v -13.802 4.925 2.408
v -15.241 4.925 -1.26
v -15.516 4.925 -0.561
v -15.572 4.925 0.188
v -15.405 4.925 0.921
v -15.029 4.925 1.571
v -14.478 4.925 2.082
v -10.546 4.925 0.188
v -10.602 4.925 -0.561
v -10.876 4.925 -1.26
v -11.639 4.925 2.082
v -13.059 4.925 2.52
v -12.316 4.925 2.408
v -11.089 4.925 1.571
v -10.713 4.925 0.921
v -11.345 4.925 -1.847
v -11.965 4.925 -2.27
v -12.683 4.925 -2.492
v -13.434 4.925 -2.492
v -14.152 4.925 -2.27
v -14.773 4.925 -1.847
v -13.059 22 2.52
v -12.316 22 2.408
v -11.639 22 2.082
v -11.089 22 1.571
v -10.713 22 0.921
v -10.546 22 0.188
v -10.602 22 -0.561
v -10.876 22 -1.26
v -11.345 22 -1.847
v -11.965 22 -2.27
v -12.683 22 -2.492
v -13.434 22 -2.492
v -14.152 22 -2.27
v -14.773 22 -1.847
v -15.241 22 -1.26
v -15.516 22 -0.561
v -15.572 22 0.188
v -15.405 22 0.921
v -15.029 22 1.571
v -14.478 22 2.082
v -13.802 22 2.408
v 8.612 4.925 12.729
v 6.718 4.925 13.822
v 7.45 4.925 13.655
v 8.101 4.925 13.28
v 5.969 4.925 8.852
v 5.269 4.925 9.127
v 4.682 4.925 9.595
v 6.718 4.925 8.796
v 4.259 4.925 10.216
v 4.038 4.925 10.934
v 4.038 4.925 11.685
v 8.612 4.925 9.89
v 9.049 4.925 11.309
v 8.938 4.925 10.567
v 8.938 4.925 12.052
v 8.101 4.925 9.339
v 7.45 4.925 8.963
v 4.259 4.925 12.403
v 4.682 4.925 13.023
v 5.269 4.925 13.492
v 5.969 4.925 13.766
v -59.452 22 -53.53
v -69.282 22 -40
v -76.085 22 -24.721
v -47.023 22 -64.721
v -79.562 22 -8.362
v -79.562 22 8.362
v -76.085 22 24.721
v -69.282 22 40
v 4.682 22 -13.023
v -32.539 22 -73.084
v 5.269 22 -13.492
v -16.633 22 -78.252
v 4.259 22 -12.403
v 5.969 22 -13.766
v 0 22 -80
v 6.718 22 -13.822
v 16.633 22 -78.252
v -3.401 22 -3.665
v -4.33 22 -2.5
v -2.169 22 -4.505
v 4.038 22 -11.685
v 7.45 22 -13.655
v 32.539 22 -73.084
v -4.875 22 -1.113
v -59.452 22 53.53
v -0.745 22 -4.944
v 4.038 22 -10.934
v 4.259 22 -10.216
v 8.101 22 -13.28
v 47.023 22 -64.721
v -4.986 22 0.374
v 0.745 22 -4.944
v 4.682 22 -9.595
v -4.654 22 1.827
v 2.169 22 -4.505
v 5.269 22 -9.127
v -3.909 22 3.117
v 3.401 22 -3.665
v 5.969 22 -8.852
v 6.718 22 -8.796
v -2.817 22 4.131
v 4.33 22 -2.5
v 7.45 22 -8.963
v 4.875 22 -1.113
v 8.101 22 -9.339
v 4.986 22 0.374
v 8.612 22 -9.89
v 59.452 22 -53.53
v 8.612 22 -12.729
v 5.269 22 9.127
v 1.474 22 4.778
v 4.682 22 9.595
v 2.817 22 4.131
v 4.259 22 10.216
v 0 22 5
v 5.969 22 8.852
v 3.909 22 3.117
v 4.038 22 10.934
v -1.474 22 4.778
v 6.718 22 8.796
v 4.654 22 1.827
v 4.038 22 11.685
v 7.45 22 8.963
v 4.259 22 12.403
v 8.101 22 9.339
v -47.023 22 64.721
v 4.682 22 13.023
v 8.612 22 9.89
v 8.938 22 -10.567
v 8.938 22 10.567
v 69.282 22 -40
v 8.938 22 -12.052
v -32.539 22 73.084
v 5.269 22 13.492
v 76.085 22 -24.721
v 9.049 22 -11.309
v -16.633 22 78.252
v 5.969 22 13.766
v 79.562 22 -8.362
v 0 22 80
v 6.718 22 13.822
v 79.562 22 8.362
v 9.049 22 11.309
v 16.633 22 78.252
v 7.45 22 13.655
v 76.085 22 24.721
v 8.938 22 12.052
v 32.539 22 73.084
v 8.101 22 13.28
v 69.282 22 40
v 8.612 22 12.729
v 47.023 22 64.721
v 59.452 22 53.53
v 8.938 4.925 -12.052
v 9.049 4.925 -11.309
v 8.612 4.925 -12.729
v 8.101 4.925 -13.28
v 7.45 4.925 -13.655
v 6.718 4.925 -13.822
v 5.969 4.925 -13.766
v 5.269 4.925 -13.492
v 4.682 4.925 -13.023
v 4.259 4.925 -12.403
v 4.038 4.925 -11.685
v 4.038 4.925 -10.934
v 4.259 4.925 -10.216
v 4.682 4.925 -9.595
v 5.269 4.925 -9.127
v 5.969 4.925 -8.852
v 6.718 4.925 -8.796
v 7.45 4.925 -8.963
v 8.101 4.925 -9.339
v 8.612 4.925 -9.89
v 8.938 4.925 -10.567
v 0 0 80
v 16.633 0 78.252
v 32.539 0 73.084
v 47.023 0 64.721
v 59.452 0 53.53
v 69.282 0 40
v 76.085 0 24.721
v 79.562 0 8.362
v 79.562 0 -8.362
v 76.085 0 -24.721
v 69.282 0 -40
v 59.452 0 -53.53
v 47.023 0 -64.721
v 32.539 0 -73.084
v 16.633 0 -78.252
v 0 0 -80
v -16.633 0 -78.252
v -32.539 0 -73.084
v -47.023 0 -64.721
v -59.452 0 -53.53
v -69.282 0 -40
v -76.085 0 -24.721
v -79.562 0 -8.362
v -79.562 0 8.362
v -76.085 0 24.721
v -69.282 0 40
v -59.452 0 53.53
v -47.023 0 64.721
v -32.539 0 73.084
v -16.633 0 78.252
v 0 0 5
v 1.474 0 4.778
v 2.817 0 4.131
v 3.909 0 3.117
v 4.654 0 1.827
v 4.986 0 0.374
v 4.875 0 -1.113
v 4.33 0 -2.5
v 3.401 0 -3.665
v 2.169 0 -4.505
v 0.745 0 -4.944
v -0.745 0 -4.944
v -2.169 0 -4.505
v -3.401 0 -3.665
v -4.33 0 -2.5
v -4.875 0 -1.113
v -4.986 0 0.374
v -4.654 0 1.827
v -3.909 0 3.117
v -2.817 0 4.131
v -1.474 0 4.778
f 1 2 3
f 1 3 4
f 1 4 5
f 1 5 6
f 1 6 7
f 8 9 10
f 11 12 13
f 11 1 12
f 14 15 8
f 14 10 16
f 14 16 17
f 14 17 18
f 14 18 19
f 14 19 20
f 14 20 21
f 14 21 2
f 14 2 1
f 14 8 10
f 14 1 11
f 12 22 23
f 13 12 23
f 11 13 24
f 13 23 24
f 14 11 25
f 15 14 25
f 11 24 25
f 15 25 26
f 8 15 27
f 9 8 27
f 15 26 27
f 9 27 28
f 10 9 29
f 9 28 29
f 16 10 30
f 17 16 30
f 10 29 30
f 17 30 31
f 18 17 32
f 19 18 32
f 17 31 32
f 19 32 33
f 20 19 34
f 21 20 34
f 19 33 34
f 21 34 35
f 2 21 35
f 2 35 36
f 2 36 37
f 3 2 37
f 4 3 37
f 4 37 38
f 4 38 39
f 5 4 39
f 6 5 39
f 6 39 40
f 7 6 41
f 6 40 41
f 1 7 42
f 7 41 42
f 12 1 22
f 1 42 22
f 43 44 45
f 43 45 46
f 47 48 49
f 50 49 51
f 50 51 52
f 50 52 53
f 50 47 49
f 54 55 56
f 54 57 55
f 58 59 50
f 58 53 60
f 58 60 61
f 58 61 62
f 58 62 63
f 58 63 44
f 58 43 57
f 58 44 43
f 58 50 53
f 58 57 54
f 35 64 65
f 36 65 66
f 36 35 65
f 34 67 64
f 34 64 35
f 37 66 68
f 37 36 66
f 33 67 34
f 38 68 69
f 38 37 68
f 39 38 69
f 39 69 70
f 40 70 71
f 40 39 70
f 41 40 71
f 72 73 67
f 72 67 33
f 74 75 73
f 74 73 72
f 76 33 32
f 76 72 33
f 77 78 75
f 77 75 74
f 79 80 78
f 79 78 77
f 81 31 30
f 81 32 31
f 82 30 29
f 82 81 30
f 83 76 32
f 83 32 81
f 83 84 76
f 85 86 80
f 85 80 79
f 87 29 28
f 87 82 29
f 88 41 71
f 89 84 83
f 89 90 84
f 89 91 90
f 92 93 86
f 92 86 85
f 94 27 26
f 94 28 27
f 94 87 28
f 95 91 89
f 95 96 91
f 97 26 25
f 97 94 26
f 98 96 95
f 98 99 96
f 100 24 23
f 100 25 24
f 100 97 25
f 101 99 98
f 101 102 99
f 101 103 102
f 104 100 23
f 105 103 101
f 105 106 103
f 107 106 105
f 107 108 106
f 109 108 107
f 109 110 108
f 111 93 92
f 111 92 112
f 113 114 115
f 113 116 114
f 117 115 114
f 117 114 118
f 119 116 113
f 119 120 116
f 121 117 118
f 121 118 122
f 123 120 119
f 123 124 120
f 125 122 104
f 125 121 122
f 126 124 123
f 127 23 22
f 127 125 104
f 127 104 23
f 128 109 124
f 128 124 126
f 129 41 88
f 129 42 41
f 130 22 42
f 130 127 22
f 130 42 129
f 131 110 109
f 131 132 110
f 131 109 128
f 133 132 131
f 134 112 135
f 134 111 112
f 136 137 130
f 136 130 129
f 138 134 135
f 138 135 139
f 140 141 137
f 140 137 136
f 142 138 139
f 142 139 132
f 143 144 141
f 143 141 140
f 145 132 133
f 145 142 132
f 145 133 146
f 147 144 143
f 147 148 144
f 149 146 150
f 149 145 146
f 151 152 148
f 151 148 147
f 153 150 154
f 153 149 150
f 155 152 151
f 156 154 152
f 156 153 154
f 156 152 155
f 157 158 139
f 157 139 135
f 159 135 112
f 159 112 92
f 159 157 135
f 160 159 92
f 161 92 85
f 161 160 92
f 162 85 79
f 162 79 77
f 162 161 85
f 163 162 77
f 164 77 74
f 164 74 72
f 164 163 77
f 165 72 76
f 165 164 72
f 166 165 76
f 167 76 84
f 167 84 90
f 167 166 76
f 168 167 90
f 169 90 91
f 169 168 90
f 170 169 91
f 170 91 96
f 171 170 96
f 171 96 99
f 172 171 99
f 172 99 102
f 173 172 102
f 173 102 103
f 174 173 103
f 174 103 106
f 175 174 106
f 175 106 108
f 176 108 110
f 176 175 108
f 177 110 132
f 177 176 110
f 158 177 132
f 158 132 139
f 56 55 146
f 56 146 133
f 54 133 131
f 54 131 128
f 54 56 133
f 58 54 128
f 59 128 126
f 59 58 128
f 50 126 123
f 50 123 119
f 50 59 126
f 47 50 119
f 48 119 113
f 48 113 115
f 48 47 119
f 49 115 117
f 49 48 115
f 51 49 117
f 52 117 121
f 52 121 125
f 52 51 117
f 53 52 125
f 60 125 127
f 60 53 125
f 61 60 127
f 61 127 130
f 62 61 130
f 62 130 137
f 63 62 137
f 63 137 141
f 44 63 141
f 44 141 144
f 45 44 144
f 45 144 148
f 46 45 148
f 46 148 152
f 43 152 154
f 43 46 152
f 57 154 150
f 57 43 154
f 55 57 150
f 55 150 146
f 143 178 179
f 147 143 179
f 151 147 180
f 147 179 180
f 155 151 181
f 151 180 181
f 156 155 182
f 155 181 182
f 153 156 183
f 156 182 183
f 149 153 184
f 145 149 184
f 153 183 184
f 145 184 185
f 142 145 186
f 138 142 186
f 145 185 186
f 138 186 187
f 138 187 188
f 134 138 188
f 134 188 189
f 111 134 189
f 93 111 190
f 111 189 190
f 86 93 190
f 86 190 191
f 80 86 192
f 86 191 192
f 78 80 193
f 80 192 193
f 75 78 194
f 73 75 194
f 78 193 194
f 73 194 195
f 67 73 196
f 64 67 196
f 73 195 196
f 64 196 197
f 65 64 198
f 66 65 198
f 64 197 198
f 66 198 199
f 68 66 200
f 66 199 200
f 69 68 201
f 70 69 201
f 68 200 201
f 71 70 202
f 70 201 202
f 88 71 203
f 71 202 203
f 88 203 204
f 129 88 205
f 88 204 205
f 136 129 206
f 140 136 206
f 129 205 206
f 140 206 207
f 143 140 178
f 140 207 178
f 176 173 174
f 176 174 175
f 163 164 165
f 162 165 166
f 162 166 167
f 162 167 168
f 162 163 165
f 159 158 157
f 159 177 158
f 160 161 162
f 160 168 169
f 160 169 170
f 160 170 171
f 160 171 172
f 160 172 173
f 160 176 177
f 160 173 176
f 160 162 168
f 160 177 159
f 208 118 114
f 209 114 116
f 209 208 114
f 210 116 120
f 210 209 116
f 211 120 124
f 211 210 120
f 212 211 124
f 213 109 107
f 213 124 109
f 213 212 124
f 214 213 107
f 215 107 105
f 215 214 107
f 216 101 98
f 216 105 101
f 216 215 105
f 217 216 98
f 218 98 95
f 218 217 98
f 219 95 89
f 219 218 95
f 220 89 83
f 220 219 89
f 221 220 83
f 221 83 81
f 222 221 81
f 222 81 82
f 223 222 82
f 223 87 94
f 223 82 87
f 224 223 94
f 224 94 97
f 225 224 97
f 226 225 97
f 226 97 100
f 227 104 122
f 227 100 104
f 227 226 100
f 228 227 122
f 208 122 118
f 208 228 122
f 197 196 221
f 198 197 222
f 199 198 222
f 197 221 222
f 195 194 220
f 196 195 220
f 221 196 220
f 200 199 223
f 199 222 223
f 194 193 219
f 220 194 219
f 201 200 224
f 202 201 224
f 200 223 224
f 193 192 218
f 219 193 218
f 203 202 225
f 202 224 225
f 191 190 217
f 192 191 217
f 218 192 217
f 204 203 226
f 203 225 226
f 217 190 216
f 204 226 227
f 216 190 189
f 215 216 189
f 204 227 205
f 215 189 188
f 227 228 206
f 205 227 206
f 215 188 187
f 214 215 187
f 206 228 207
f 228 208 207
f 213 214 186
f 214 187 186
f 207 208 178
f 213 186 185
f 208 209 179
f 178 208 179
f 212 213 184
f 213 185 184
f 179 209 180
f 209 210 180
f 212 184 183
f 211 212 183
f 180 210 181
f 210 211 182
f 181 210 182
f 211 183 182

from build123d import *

# Parameters (mm, degrees)
SKETCH1_R           = 80
BOSS_EXTRUDE1_DEPTH = 22
SKETCH2_R           = 5
CUT_EXTRUDE1_DEPTH  = 116.256236274
SKETCH3_R           = 2.520042376
CUT_EXTRUDE2_DEPTH  = 17.07476964
CIRPATTERN1_COUNT   = 3


with BuildPart() as part:
    # Sketch1 → Boss-Extrude1 (new body)
    with BuildSketch(Plane(origin=(0, 0, 0), x_dir=(1, 0, 0), z_dir=(0, 1, 0))):
        Circle(SKETCH1_R)
    extrude(amount=BOSS_EXTRUDE1_DEPTH)

    # Sketch2 → Cut-Extrude1 (cut, through all)
    with BuildSketch(Plane(origin=(0, 0, 0), x_dir=(1, 0, 0), z_dir=(0, 1, 0))):
        Circle(SKETCH2_R)
    extrude(amount=CUT_EXTRUDE1_DEPTH, mode=Mode.SUBTRACT)

    # Sketch3 → Cut-Extrude2 (cut)
    with BuildSketch(Plane(origin=(0, 22, 0), x_dir=(1, 0, 0), z_dir=(0, 1, 0))):
        with Locations((-13.058893853, 0)):
            Circle(SKETCH3_R)
    cut_extrude2 = extrude(amount=-CUT_EXTRUDE2_DEPTH, mode=Mode.SUBTRACT)

    # CirPattern1: Cut-Extrude2 ×3 about axis
    cirpattern1_axis = Axis((0, 0, 0), (0, 1, 0))
    for i in range(1, CIRPATTERN1_COUNT):
        add(cut_extrude2.rotate(cirpattern1_axis, i * 360 / CIRPATTERN1_COUNT), mode=Mode.SUBTRACT)


solid = part.part
